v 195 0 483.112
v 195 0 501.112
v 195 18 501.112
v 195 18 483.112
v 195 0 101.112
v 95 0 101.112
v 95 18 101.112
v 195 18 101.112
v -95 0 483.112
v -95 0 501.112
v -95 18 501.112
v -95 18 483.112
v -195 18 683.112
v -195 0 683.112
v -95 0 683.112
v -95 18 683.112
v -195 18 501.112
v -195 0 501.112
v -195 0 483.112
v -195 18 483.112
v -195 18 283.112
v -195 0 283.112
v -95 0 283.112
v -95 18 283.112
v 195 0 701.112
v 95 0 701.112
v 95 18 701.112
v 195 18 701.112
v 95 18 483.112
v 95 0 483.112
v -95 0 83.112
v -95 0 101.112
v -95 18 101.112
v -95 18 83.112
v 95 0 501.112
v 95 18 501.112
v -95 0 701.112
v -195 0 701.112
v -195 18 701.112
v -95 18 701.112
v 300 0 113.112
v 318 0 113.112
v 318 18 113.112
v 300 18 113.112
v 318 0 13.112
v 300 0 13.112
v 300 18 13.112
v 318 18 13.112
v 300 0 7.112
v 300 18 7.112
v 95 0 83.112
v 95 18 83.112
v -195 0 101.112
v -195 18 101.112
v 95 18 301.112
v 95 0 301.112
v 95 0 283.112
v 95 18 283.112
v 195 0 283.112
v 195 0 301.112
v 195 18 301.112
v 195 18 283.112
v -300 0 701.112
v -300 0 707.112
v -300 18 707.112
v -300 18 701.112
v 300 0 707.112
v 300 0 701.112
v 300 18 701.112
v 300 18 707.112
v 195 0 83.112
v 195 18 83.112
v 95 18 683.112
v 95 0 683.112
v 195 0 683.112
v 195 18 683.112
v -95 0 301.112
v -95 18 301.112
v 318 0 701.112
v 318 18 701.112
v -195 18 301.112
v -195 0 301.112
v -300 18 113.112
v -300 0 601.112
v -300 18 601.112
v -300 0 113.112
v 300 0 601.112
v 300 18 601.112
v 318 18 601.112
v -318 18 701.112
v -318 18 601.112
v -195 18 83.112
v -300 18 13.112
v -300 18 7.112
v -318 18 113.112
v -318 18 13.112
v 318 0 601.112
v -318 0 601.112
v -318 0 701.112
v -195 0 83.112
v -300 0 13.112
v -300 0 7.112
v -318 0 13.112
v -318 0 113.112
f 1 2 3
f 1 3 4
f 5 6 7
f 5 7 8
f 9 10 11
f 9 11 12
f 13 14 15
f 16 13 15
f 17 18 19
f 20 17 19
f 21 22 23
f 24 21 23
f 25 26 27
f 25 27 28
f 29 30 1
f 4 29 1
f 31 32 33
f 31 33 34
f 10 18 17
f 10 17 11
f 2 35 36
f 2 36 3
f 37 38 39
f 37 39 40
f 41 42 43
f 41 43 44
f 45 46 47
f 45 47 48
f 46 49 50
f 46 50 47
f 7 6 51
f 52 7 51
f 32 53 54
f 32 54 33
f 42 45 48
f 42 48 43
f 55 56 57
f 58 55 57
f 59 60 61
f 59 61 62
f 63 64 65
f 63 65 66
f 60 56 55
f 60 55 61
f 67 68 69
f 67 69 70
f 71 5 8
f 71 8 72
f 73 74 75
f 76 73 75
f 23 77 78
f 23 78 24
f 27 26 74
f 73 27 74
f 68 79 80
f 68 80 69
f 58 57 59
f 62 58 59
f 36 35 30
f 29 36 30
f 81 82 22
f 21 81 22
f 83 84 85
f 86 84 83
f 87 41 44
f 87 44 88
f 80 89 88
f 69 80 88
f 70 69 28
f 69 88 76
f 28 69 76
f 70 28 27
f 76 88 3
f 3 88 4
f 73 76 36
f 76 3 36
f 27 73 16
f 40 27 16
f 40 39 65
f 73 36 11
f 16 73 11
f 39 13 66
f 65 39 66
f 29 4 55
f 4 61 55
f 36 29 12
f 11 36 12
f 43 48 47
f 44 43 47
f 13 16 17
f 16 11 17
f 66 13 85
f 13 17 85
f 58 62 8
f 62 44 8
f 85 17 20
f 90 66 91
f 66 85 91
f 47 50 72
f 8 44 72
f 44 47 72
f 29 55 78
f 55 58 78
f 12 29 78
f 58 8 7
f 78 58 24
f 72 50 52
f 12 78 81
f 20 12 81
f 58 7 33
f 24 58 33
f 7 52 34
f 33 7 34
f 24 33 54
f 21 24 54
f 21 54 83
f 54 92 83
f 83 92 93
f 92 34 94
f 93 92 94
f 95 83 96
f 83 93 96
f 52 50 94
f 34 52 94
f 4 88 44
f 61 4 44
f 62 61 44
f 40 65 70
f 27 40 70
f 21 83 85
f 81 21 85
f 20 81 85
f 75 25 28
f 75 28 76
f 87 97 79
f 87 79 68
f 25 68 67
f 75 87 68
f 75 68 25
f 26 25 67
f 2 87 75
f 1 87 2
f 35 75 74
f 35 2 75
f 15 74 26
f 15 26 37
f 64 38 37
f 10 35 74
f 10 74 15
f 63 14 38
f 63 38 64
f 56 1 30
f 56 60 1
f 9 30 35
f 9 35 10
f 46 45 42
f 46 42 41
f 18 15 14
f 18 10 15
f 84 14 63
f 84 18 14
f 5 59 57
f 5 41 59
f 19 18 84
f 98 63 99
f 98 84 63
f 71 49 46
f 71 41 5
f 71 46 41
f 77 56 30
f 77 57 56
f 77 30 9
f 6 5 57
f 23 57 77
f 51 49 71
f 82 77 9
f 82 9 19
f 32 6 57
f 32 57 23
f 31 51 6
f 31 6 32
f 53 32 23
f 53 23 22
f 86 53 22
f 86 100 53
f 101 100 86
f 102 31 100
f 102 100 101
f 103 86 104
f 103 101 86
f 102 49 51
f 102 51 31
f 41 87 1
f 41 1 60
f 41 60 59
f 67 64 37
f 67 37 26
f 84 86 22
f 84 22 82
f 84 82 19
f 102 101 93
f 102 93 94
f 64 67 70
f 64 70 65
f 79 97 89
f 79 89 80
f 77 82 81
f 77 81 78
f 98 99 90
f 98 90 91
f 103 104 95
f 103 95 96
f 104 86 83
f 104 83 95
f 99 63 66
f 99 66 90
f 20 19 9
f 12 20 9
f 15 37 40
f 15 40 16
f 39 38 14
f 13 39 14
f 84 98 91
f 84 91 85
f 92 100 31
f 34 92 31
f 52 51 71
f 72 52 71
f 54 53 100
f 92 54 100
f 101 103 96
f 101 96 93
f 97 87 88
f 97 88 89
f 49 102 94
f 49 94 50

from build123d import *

# Parameters (mm, degrees)
SKETCH1_W           = 100
SKETCH1_H           = 18
BOSS_EXTRUDE1_DEPTH = 18


with BuildPart() as part:
    # Sketch1 → Boss-Extrude1 (new body)
    with BuildSketch(Plane(origin=(0, 0, 0), x_dir=(1, 0, 0), z_dir=(0, 1, 0))):
        Polygon((-300, -7.111898923), (300, -7.111898923), (300, -13.111898923), (318, -13.111898923), (318, -113.111898923), (300, -113.111898923), (300, -601.111898923), (318, -601.111898923), (318, -701.111898923), (300, -701.111898923), (300, -707.111898923), (-300, -707.111898923), (-300, -701.111898923), (-318, -701.111898923), (-318, -601.111898923), (-300, -601.111898923), (-300, -113.111898923), (-318, -113.111898923), (-318, -13.111898923), (-300, -13.111898923), align=None)
        with Locations((-145, -692.111898923)):
            Rectangle(SKETCH1_W, SKETCH1_H, mode=Mode.SUBTRACT)
        with Locations((145, -692.111898923)):
            Rectangle(SKETCH1_W, SKETCH1_H, mode=Mode.SUBTRACT)
        with Locations((145, -492.111898923)):
            Rectangle(SKETCH1_W, SKETCH1_H, mode=Mode.SUBTRACT)
        with Locations((-145, -492.111898923)):
            Rectangle(SKETCH1_W, SKETCH1_H, mode=Mode.SUBTRACT)
        with Locations((145, -292.111898923)):
            Rectangle(SKETCH1_W, SKETCH1_H, mode=Mode.SUBTRACT)
        with Locations((-145, -292.111898923)):
            Rectangle(SKETCH1_W, SKETCH1_H, mode=Mode.SUBTRACT)
        with Locations((145, -92.111898923)):
            Rectangle(SKETCH1_W, SKETCH1_H, mode=Mode.SUBTRACT)
        with Locations((-145, -92.111898923)):
            Rectangle(SKETCH1_W, SKETCH1_H, mode=Mode.SUBTRACT)
    extrude(amount=BOSS_EXTRUDE1_DEPTH)


solid = part.part
